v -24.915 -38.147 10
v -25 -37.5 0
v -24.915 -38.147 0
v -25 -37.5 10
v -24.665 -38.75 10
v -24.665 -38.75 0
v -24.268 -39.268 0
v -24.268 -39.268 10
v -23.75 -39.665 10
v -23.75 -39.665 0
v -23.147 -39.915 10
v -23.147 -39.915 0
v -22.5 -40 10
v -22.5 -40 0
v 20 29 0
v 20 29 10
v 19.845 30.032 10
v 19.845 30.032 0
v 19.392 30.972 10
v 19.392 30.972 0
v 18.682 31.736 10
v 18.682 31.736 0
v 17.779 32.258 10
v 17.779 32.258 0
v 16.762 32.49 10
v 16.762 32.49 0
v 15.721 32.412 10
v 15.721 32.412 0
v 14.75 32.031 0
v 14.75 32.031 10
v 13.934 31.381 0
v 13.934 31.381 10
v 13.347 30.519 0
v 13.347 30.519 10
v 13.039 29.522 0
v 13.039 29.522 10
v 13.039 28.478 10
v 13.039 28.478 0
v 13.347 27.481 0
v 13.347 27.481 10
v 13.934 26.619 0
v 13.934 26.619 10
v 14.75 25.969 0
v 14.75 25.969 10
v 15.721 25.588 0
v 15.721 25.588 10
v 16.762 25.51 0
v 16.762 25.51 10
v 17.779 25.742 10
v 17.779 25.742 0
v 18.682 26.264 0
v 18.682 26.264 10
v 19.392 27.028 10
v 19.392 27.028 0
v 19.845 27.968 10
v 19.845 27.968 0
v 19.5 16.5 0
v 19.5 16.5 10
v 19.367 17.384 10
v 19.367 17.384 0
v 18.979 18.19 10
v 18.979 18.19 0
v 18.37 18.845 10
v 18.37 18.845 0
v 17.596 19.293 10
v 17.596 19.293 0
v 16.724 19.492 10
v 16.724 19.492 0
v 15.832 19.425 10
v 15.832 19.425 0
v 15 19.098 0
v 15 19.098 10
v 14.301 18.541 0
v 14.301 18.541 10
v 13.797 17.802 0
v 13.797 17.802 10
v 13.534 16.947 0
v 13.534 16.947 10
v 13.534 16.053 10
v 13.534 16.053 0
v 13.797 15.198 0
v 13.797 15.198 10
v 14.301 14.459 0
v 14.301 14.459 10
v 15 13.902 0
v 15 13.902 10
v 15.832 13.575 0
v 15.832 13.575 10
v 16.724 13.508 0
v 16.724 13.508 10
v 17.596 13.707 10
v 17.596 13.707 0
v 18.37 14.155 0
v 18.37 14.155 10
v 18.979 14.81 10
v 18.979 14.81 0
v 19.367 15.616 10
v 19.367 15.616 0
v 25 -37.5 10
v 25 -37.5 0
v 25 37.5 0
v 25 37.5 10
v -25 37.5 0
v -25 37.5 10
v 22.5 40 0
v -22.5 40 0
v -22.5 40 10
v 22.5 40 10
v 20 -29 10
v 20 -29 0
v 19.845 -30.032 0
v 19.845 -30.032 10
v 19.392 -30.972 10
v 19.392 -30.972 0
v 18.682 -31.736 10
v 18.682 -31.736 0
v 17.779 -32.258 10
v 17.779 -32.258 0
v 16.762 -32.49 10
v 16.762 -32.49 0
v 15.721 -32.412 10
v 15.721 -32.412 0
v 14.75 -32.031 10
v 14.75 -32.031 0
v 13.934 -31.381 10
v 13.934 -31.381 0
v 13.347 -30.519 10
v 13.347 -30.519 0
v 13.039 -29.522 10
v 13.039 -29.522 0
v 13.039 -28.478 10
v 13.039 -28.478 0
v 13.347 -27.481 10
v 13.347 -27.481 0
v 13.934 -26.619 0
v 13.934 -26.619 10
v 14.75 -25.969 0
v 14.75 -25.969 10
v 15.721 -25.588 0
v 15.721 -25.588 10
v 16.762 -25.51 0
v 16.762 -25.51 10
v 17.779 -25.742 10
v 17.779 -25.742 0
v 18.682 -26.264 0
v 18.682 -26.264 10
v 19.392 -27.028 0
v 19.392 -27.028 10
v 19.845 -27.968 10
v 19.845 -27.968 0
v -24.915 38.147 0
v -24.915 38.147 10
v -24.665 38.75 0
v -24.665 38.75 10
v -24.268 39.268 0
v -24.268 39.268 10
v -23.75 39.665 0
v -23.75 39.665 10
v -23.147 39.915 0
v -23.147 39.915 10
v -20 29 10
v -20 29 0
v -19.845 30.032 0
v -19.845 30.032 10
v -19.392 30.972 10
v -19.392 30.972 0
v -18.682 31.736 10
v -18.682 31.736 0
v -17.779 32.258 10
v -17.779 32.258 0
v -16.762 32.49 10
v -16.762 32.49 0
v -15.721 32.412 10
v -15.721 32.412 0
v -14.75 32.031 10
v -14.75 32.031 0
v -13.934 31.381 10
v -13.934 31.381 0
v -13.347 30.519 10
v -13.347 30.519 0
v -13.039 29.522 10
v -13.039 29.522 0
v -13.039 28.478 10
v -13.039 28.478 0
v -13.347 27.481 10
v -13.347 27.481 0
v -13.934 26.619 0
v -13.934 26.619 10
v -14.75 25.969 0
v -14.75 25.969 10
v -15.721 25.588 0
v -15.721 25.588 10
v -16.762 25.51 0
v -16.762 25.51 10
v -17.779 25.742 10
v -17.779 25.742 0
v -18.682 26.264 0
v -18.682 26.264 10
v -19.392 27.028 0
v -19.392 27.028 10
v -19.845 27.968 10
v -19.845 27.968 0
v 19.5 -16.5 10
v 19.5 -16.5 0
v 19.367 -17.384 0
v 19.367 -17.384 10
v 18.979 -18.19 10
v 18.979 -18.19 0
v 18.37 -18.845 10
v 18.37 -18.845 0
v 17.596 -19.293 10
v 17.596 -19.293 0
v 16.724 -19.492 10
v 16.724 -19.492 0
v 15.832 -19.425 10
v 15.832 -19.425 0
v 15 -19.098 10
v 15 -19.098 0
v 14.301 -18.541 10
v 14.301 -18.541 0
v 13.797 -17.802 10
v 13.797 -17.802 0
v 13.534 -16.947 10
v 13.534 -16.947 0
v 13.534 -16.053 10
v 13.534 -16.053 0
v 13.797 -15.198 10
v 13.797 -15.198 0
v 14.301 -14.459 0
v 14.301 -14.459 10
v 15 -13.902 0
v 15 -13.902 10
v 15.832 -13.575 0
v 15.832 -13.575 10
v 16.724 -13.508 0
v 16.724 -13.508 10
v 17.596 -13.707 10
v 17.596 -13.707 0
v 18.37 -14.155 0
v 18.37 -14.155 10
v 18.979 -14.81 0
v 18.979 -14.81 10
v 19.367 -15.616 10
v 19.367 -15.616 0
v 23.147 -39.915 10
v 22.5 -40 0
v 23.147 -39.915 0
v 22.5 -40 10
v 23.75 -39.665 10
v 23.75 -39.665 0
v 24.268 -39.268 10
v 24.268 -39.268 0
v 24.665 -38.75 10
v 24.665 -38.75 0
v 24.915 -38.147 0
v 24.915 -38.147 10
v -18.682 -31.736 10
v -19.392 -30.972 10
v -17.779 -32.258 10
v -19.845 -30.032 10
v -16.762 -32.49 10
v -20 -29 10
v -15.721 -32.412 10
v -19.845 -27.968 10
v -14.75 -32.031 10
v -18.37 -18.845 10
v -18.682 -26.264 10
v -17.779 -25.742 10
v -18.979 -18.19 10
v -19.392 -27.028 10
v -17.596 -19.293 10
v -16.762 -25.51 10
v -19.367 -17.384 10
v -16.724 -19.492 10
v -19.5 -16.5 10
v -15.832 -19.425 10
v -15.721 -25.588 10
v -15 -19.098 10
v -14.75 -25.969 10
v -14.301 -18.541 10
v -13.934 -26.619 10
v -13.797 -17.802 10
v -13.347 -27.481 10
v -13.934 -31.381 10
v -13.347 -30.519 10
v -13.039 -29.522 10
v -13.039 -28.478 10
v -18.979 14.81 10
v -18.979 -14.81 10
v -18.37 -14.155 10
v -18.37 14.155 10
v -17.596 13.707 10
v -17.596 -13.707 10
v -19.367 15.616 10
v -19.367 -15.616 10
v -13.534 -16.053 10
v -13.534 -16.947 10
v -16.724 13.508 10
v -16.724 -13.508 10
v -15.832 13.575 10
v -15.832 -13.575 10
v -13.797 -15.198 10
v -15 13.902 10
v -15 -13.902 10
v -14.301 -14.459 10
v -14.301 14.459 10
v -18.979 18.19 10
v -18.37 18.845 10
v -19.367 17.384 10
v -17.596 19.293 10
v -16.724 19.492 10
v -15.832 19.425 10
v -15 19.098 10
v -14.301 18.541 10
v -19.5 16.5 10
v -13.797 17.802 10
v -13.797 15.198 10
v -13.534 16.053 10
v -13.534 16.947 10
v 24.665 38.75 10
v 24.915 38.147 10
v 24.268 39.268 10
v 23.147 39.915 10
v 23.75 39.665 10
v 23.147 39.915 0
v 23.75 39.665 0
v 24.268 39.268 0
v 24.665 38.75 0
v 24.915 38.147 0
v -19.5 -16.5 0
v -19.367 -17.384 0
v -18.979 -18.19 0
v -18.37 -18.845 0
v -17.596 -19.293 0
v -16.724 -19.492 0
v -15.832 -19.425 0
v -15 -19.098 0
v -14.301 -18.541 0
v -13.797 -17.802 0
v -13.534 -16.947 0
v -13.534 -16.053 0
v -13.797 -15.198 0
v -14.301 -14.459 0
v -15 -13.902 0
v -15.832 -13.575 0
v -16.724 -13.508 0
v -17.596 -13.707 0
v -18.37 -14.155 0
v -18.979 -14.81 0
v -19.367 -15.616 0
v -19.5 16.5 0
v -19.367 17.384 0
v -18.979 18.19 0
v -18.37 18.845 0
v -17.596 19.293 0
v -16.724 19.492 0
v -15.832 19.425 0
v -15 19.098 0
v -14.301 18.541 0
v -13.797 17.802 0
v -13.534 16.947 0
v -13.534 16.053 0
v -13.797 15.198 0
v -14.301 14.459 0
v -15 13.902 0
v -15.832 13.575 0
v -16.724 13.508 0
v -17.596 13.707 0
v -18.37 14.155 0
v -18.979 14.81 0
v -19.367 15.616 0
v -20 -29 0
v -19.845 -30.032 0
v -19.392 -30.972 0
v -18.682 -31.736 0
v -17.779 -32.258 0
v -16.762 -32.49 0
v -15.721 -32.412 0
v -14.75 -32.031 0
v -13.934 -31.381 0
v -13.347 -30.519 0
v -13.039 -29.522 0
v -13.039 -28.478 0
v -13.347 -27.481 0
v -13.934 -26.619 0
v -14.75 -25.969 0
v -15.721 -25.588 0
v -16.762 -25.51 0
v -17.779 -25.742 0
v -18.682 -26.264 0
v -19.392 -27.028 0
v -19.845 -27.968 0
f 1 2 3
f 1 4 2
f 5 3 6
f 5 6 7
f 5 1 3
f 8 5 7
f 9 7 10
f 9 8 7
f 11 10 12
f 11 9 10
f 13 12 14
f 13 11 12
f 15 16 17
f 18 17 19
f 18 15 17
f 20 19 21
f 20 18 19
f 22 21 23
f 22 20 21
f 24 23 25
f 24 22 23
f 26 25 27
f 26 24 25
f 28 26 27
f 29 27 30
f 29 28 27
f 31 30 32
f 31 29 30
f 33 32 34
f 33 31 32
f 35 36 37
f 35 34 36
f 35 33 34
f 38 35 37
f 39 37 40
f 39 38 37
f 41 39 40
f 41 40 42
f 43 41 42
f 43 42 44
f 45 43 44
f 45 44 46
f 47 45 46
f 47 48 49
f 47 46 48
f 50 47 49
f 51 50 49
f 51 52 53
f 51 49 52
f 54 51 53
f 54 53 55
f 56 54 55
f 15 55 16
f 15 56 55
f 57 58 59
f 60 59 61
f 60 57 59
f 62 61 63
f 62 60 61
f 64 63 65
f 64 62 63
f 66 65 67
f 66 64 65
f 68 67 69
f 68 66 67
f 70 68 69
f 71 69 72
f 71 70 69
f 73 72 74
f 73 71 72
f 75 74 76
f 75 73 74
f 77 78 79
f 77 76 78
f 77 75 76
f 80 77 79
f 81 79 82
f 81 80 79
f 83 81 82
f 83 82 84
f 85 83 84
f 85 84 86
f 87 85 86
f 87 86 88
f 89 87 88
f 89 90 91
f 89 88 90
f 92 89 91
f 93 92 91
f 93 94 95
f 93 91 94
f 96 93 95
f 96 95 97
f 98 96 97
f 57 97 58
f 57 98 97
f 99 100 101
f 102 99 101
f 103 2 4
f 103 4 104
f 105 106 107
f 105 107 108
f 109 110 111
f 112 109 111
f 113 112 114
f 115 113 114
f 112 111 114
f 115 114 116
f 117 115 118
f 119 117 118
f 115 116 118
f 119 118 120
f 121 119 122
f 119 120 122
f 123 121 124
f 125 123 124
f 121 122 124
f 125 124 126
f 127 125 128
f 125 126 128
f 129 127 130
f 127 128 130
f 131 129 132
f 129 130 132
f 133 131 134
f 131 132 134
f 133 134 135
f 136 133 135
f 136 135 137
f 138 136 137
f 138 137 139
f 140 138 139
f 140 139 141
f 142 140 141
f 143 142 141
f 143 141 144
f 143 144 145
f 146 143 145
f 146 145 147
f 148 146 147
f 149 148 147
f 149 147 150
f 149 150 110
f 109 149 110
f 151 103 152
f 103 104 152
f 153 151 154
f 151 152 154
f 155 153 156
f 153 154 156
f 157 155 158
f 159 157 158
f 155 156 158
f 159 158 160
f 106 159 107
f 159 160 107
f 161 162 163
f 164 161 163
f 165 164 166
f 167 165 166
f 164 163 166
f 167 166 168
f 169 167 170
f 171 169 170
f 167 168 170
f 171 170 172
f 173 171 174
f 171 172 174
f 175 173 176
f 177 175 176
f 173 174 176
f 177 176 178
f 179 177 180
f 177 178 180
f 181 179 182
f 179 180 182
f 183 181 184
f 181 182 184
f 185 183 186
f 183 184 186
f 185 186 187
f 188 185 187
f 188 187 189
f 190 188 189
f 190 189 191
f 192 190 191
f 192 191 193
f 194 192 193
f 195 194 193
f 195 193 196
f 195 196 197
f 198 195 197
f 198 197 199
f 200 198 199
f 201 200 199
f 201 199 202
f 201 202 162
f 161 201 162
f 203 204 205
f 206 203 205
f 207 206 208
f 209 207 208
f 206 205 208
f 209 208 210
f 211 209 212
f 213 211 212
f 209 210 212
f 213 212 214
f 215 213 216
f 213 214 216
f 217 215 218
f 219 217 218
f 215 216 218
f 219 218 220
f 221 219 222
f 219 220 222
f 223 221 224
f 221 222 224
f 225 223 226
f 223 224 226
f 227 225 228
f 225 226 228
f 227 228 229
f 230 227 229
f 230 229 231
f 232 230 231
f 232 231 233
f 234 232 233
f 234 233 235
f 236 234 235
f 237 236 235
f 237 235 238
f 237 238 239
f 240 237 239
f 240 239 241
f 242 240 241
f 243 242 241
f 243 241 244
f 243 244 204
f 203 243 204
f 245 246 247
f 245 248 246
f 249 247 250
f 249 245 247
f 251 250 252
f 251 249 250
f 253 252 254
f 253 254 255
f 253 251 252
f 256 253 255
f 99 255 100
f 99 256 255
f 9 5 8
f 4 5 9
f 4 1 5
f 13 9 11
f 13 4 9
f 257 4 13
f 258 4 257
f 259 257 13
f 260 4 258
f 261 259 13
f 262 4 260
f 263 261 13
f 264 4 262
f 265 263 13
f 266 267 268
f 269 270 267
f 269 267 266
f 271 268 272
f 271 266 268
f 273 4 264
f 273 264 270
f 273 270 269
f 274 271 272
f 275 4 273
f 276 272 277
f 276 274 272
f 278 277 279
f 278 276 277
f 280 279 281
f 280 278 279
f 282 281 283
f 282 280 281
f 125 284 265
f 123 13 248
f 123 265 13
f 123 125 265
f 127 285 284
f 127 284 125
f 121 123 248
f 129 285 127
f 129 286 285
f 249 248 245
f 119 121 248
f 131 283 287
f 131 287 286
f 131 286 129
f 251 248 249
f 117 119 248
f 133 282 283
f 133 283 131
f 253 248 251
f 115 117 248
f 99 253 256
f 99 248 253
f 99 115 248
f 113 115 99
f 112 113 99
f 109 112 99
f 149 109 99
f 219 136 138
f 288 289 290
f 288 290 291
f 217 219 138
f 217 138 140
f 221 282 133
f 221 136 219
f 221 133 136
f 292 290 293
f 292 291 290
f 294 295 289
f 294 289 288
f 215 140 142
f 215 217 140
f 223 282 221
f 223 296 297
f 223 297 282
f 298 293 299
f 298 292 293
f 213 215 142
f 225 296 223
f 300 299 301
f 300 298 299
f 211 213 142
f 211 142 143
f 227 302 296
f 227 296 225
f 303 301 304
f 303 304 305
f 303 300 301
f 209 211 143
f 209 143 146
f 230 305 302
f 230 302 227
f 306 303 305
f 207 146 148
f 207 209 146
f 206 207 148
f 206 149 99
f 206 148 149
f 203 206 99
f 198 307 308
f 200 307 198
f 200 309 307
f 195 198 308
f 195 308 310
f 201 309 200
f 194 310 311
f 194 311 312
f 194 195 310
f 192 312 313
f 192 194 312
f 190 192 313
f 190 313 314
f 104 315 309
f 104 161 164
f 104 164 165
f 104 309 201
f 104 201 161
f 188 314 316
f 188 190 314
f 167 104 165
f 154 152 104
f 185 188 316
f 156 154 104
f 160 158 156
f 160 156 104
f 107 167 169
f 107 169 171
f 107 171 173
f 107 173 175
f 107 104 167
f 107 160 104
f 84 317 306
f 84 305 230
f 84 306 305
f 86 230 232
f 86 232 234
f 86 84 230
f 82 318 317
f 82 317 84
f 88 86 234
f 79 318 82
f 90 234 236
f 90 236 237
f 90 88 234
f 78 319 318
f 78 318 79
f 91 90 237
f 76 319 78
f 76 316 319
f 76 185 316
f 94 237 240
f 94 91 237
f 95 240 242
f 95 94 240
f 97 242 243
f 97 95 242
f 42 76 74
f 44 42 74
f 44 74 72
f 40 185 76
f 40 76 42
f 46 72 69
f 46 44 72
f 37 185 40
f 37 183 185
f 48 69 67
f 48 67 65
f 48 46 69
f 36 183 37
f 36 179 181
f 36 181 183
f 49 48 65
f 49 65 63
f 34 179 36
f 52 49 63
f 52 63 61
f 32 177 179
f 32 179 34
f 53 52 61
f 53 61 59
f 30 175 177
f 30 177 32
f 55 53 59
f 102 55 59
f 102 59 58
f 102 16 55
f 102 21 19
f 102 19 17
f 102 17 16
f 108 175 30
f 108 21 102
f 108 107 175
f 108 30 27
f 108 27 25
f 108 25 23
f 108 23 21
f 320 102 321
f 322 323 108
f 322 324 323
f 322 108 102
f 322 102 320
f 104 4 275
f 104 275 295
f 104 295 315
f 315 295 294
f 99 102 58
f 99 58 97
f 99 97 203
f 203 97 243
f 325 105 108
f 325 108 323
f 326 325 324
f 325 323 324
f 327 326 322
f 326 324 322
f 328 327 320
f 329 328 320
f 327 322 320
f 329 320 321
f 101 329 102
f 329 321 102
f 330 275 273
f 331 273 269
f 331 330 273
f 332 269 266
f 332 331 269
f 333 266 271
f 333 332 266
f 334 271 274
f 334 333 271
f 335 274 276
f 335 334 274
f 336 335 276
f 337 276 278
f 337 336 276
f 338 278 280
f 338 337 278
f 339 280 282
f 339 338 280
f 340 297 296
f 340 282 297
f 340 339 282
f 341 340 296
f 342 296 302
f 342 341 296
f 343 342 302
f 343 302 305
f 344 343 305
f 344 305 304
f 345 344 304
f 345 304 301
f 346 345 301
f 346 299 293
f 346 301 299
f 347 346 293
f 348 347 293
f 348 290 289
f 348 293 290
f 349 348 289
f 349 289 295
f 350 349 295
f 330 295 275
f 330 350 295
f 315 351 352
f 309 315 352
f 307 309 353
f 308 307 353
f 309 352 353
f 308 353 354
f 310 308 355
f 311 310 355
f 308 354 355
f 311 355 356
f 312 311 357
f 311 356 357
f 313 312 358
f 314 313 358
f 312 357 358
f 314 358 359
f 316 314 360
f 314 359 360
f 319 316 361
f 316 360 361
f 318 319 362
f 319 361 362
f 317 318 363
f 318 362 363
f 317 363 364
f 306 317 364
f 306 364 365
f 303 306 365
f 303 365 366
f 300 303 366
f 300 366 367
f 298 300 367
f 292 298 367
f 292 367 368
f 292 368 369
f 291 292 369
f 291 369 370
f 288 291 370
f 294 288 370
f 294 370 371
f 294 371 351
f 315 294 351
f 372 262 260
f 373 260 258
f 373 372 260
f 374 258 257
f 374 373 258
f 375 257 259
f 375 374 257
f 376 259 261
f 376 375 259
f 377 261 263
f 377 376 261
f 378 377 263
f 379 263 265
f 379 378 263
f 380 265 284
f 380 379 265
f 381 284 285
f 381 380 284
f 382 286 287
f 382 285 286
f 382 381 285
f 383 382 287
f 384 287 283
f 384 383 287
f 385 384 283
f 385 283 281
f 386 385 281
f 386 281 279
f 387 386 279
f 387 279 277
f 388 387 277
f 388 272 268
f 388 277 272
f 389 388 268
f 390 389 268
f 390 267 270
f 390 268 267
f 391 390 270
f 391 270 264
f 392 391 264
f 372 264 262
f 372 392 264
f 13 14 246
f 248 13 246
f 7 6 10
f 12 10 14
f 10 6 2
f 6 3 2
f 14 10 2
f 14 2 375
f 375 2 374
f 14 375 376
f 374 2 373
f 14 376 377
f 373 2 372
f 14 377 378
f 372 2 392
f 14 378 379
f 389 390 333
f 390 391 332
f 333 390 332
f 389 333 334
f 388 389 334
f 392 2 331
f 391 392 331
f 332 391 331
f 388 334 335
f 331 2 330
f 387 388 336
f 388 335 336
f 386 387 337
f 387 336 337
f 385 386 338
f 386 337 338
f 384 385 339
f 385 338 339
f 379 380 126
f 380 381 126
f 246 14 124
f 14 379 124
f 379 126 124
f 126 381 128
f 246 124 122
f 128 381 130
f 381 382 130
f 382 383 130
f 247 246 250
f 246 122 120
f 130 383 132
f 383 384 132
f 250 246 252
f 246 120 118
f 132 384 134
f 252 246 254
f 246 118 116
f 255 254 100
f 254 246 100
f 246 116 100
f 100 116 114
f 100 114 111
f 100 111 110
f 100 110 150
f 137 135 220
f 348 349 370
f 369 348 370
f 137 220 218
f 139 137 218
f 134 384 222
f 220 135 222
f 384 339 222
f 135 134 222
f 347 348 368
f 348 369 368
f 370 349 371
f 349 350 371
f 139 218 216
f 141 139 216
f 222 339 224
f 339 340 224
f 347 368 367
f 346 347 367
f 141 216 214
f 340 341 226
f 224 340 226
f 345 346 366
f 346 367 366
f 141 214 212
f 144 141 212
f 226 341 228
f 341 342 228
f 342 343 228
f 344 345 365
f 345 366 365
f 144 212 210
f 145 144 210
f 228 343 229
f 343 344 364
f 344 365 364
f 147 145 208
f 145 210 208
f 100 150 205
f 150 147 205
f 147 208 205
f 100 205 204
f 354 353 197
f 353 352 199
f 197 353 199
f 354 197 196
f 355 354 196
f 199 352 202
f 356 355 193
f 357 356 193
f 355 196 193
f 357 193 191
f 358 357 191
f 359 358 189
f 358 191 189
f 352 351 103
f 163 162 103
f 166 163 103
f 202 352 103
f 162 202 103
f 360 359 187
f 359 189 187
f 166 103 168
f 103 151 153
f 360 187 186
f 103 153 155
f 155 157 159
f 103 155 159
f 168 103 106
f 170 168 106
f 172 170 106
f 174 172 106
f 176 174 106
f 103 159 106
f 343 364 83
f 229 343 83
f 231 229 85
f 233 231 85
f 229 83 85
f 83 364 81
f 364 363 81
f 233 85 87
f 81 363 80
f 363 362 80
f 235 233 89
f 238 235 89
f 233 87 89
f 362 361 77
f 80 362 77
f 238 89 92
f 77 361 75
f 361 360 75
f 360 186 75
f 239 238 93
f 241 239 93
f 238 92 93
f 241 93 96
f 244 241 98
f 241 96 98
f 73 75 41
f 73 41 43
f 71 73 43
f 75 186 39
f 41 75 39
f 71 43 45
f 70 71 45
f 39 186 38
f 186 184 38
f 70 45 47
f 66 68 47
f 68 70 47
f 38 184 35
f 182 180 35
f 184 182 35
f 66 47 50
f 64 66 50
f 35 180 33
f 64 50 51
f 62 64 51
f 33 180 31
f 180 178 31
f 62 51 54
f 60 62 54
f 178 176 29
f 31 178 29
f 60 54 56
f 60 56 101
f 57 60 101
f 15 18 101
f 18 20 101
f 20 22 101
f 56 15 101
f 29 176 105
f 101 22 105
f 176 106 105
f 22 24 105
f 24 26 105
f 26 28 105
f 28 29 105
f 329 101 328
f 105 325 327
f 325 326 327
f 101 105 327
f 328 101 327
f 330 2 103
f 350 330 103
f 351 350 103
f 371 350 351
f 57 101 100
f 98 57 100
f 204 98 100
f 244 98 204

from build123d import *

# Parameters (mm, degrees)
SKETCH_2_W                 = 50
SKETCH_2_H                 = 80
EXTRUDE_1_DEPTH            = 10
SKETCH_3_R                 = 3.5
SKETCH_3_R_2               = 3
CUT_EXTRUDE_1_DEPTH        = 49.218253805
MIRROR_2_COPY_1_SKETCH_R   = 3.5
MIRROR_2_COPY_1_SKETCH_R_2 = 3
MIRROR_2_COPY_1_DEPTH      = 49.218253805
FILLET_1_R                 = 2.5


with BuildPart() as part:
    # 草图2 → 凸台-拉伸1 (new body)
    with BuildSketch(Plane.XY):
        Rectangle(SKETCH_2_W, SKETCH_2_H)
    extrude(amount=EXTRUDE_1_DEPTH)

    # 草图3 → 切除-拉伸1 (cut, through all)
    with BuildSketch(Plane(origin=(0, 0, 0), x_dir=(-1, 0, 0), z_dir=(0, 0, -1))):
        with Locations((16.5, 29)):
            Circle(SKETCH_3_R)
        with Locations((16.5, 16.5)):
            Circle(SKETCH_3_R_2)
    cut_extrude_1 = extrude(amount=-CUT_EXTRUDE_1_DEPTH, mode=Mode.SUBTRACT)

    # 镜向1: 切除-拉伸1 across plane
    add(cut_extrude_1.mirror(Plane(origin=(0, 0, 0), x_dir=(0, 0, 1), z_dir=(1, 0, 0))), mode=Mode.SUBTRACT)

    # 镜向2: 切除-拉伸1 across plane
    add(cut_extrude_1.mirror(Plane.ZX), mode=Mode.SUBTRACT)

    # 镜向2 copy 1 sketch → 镜向2 copy 1 (cut, through all)
    with BuildSketch(Plane(origin=(0, 0, 0), x_dir=(1, 0, 0), z_dir=(0, 0, -1))):
        with Locations((16.5, 29)):
            Circle(MIRROR_2_COPY_1_SKETCH_R)
        with Locations((16.5, 16.5)):
            Circle(MIRROR_2_COPY_1_SKETCH_R_2)
    extrude(amount=-MIRROR_2_COPY_1_DEPTH, mode=Mode.SUBTRACT)

    # 圆角1
    fillet_1_edges = [part.edges().sort_by_distance(p)[0] for p in [
        (-25, 40, 5),
        (25, 40, 5),
        (25, -40, 5),
        (-25, -40, 5),
    ]]
    fillet(fillet_1_edges, radius=FILLET_1_R)


solid = part.part
